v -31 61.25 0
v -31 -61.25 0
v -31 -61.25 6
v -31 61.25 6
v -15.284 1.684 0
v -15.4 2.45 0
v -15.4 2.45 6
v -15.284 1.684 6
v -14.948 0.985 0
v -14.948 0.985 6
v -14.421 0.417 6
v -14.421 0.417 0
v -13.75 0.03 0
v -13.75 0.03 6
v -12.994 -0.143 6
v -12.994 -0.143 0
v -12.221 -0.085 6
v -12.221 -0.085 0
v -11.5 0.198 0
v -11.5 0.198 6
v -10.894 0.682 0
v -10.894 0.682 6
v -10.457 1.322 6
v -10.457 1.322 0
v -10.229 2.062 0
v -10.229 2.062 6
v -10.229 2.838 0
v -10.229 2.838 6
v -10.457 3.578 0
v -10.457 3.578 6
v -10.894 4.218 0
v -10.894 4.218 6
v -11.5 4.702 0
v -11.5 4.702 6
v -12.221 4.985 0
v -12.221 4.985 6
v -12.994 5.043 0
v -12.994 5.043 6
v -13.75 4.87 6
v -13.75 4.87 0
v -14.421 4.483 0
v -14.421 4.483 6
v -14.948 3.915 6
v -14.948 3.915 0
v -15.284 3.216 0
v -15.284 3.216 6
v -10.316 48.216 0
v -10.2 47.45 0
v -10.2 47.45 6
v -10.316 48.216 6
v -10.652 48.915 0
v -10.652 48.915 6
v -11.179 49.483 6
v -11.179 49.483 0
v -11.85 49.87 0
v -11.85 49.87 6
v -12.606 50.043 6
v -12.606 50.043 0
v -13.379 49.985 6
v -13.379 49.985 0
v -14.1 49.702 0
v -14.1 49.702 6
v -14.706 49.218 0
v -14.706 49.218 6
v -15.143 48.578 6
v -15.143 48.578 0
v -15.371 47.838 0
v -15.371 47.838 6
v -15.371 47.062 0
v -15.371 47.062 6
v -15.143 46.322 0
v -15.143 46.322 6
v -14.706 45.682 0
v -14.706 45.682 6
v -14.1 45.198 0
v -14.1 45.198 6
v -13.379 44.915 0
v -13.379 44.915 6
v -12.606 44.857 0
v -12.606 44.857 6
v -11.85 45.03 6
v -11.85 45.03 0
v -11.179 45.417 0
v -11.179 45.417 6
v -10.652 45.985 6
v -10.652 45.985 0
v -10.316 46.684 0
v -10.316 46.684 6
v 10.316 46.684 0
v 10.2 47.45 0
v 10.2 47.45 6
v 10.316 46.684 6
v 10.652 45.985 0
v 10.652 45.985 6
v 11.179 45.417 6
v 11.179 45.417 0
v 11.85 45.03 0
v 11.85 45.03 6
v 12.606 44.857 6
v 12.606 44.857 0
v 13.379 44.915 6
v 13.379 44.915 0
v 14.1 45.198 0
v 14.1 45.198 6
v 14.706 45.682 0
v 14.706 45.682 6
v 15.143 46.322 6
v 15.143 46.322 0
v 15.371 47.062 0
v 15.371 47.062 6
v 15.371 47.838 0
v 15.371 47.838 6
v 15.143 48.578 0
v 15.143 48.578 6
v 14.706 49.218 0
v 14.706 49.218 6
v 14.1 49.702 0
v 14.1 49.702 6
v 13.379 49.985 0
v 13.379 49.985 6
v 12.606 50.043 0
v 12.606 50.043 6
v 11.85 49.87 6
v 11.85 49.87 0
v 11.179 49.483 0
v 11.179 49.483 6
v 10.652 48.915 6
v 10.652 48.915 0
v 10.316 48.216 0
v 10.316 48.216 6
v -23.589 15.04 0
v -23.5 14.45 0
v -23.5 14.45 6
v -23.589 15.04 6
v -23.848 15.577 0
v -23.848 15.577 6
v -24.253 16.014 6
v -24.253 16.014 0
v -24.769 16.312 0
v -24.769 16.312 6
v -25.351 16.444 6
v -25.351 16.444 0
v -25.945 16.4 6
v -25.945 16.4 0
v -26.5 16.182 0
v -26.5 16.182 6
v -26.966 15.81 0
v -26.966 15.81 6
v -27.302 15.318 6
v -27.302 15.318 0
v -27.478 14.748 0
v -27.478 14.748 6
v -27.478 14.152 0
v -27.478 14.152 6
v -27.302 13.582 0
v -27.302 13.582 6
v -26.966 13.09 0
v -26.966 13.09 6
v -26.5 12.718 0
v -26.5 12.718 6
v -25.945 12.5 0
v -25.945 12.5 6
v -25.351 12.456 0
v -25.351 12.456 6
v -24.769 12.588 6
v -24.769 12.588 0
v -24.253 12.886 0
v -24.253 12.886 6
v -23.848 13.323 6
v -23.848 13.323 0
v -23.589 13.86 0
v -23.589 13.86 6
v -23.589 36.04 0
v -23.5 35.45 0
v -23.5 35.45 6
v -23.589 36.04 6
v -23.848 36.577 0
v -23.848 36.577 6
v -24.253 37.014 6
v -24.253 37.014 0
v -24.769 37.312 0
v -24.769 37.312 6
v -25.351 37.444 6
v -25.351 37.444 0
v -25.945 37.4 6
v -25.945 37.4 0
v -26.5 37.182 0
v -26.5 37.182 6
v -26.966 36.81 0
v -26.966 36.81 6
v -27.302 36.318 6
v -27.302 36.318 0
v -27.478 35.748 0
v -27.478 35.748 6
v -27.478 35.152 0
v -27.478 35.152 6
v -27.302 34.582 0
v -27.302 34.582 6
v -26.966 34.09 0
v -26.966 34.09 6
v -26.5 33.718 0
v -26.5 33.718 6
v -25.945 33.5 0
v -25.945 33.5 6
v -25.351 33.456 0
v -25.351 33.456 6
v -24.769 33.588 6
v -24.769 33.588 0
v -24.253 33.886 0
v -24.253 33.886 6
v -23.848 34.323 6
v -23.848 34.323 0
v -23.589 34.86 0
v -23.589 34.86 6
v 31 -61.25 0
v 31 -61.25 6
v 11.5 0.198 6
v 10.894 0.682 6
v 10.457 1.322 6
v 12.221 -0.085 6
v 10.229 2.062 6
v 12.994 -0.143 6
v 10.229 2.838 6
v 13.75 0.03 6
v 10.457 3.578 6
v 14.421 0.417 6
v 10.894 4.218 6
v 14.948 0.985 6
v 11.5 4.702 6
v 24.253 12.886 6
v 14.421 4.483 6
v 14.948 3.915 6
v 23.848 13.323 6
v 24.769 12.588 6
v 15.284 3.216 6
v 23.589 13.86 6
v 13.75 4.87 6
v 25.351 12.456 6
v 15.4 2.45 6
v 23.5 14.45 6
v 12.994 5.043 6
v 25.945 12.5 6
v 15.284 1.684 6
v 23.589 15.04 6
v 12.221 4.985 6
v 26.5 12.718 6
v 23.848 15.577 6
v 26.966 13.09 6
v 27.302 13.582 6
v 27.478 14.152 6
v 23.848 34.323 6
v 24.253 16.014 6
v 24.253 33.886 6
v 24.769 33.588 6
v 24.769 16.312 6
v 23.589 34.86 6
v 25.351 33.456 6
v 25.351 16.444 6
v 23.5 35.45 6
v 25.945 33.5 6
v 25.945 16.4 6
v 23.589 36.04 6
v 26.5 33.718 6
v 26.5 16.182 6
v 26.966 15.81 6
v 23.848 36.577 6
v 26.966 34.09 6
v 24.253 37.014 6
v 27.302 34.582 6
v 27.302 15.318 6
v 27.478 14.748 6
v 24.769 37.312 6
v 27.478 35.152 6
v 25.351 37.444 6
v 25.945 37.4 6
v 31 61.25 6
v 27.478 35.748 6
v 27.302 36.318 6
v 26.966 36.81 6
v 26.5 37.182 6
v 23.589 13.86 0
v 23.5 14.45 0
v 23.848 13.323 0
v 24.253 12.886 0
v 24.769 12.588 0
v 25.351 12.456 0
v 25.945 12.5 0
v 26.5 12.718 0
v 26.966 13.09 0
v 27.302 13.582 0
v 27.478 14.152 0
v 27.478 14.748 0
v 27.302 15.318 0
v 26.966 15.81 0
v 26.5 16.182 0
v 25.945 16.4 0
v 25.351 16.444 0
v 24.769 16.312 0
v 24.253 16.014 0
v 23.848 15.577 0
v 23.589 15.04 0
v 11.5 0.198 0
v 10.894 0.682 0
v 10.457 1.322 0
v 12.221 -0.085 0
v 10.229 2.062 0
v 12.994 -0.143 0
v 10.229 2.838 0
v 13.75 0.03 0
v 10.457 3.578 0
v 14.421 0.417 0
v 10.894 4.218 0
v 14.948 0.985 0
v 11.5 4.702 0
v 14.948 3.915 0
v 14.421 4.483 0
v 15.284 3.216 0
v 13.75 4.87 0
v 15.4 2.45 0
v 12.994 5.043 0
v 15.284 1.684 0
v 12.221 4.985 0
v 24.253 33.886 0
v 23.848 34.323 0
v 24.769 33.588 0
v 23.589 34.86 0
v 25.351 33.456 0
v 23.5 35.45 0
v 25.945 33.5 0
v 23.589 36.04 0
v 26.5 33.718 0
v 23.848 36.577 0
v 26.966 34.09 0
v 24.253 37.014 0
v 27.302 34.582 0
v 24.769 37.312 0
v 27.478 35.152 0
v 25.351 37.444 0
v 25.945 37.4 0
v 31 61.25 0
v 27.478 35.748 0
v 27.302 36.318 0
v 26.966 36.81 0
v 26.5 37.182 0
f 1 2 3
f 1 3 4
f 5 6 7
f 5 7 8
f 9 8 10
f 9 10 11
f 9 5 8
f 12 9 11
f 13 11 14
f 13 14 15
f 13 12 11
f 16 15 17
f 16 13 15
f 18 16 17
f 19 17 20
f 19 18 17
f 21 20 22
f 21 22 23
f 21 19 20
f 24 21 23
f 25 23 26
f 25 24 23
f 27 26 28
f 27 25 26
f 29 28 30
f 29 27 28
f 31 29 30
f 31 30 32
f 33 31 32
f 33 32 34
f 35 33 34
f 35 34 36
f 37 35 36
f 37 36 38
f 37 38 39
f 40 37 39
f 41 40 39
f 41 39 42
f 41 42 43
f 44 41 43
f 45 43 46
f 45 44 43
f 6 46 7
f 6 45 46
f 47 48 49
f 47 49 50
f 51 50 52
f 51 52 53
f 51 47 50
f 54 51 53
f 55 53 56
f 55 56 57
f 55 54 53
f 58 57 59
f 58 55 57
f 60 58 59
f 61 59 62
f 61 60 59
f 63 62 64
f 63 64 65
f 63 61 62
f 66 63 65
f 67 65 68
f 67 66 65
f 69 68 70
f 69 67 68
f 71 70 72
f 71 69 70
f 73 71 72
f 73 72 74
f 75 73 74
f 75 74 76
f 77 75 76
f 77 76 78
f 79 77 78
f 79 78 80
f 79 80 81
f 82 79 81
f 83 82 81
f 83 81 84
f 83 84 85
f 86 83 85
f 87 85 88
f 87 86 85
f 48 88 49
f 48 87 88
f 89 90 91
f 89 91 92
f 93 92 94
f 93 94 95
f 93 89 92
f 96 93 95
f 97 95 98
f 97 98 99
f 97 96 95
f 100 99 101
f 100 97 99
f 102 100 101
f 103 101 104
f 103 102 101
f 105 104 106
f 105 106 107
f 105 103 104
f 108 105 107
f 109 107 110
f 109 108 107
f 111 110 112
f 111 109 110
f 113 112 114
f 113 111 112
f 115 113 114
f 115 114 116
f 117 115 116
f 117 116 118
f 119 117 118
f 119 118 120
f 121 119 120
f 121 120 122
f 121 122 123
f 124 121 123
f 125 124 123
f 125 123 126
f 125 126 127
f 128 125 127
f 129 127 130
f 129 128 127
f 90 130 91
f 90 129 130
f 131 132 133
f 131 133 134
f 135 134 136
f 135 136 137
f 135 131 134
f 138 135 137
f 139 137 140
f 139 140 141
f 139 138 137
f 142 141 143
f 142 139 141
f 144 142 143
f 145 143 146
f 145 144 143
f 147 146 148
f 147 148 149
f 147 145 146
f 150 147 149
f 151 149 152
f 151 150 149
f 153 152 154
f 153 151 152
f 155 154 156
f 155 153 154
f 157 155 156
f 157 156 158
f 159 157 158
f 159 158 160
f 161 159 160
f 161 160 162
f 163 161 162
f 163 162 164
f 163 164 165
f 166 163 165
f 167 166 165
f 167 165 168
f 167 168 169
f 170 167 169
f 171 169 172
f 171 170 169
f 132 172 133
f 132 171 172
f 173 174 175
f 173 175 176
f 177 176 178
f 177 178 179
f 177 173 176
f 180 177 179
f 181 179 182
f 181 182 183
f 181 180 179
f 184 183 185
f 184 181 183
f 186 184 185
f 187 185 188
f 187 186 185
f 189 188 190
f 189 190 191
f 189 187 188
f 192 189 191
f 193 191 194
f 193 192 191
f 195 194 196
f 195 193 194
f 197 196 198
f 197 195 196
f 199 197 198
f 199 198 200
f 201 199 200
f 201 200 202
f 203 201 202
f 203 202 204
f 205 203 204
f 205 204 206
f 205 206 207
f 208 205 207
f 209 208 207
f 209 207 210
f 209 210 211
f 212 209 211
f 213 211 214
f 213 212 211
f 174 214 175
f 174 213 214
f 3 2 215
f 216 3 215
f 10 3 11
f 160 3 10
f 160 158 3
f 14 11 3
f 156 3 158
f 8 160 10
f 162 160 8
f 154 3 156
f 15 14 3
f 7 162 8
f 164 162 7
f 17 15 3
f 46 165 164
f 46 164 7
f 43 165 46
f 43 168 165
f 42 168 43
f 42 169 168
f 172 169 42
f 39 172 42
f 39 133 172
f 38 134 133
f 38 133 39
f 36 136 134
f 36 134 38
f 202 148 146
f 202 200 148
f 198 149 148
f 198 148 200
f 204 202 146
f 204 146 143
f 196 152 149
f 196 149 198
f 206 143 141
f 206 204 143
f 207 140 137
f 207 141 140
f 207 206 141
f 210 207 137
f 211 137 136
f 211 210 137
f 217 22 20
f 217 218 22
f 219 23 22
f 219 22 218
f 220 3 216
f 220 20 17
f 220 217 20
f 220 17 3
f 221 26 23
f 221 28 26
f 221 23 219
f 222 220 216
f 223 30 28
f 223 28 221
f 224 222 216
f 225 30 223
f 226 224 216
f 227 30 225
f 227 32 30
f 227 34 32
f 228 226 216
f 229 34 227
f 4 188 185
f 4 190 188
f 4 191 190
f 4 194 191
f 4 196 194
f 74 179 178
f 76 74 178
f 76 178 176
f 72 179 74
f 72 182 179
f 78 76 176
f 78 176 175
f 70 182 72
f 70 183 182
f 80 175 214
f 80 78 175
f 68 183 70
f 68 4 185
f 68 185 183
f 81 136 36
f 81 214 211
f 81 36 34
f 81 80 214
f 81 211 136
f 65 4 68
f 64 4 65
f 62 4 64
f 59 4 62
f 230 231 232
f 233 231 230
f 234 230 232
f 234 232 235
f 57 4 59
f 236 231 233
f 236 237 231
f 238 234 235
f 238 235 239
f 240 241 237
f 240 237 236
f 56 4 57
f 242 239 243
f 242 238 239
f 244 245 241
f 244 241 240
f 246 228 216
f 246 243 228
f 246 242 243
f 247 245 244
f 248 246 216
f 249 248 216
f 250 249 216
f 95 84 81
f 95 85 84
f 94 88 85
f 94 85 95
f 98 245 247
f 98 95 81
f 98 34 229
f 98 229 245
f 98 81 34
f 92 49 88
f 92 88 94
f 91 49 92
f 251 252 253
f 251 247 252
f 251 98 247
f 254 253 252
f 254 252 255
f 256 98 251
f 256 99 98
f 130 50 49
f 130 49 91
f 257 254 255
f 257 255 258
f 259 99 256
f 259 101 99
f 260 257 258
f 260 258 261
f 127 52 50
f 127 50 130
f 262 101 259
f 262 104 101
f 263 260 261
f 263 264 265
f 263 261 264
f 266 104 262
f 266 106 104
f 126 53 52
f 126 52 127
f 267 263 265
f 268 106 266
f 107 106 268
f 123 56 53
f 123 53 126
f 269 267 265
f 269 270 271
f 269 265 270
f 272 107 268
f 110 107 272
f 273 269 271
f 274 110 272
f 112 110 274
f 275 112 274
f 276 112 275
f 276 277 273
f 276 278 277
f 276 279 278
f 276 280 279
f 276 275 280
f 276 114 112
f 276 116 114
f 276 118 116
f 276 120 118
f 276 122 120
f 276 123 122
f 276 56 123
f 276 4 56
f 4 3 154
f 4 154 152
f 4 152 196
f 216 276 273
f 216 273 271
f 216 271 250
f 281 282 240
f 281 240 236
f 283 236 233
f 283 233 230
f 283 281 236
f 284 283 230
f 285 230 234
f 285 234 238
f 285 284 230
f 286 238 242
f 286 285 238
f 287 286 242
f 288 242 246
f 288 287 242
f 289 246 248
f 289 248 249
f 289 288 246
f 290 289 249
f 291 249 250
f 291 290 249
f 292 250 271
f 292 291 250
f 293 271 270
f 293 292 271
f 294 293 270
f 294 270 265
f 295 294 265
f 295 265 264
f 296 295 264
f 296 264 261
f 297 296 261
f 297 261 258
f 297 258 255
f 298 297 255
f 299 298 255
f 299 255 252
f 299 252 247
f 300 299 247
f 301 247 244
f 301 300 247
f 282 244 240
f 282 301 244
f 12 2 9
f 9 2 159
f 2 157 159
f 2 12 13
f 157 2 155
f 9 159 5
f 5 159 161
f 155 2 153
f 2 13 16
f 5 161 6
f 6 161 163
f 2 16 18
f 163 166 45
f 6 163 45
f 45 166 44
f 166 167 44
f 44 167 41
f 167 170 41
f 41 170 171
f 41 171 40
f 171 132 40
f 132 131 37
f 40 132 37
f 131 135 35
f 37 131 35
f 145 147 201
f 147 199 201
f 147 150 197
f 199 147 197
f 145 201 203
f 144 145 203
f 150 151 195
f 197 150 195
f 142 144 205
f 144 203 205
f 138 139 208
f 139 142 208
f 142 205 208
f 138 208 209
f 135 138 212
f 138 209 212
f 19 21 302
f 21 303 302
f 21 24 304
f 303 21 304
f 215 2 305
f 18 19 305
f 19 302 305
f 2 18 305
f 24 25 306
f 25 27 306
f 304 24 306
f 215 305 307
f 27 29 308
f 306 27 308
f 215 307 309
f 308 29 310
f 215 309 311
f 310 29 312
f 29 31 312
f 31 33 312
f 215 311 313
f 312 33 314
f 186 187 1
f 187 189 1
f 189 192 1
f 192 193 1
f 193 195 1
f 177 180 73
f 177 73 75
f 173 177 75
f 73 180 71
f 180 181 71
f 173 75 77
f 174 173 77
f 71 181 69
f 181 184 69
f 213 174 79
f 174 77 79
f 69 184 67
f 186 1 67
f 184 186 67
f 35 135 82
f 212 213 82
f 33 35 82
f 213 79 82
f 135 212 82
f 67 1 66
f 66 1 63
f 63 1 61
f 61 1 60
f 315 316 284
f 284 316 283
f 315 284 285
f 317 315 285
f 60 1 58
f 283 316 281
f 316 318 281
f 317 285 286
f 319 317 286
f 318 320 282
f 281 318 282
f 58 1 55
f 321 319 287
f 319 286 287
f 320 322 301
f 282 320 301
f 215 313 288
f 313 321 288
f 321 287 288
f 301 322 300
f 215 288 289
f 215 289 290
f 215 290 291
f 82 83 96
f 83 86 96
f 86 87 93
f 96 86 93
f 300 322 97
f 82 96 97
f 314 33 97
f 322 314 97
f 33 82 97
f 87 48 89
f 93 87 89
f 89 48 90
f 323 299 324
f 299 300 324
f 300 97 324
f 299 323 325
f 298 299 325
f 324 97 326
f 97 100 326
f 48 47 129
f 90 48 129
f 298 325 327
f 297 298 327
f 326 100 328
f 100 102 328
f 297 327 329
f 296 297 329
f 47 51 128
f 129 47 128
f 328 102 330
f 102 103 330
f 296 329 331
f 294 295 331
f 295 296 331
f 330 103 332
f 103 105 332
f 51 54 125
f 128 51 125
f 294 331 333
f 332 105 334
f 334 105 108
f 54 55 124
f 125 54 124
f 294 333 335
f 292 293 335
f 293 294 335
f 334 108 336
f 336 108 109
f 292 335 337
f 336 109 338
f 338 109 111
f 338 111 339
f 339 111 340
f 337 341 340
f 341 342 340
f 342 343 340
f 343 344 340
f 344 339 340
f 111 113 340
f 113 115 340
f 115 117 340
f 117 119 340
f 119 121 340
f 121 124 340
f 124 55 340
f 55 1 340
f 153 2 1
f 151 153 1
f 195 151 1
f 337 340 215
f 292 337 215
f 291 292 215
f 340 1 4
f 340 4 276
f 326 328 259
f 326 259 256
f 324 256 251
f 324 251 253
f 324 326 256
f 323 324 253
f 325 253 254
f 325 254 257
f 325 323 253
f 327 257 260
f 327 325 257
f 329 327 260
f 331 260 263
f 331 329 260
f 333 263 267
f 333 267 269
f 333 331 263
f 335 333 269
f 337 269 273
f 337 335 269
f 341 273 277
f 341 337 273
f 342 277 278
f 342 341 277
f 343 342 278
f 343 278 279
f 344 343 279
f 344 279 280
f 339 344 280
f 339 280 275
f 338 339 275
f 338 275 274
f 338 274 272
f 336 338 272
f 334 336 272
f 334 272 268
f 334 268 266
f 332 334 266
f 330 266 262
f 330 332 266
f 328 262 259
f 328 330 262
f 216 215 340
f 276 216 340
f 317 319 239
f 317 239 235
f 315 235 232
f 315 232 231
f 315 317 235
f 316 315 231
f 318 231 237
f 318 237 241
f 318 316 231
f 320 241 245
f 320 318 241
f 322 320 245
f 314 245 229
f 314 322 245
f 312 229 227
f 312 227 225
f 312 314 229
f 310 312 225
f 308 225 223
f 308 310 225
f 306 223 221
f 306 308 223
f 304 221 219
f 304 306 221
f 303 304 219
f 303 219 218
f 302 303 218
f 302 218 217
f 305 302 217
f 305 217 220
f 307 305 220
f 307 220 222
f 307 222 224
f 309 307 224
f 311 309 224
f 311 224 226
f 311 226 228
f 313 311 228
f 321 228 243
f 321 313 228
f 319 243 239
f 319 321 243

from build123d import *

# Parameters (mm, degrees)
SKETCH_1_W      = 62
SKETCH_1_H      = 122.5
SKETCH_1_R      = 2
SKETCH_1_R_2    = 2.6
EXTRUDE_1_DEPTH = 6


with BuildPart() as part:
    # 草图1 → 凸台-拉伸1 (new body)
    with BuildSketch(Plane.XY):
        Rectangle(SKETCH_1_W, SKETCH_1_H)
        with Locations((-25.5, 35.45)):
            Circle(SKETCH_1_R, mode=Mode.SUBTRACT)
        with Locations((-25.5, 14.45)):
            Circle(SKETCH_1_R, mode=Mode.SUBTRACT)
        with Locations(Location((25.5, 14.45, 0), (0, 0, 180))):
            Circle(SKETCH_1_R, mode=Mode.SUBTRACT)
        with Locations(Location((25.5, 35.45, 0), (0, 0, 180))):
            Circle(SKETCH_1_R, mode=Mode.SUBTRACT)
        with Locations((-12.8, 47.45)):
            Circle(SKETCH_1_R_2, mode=Mode.SUBTRACT)
        with Locations(Location((12.8, 47.45, 0), (0, 0, 180))):
            Circle(SKETCH_1_R_2, mode=Mode.SUBTRACT)
        with Locations((12.8, 2.45)):
            Circle(SKETCH_1_R_2, mode=Mode.SUBTRACT)
        with Locations(Location((-12.8, 2.45, 0), (0, 0, 180))):
            Circle(SKETCH_1_R_2, mode=Mode.SUBTRACT)
    extrude(amount=EXTRUDE_1_DEPTH)


solid = part.part
